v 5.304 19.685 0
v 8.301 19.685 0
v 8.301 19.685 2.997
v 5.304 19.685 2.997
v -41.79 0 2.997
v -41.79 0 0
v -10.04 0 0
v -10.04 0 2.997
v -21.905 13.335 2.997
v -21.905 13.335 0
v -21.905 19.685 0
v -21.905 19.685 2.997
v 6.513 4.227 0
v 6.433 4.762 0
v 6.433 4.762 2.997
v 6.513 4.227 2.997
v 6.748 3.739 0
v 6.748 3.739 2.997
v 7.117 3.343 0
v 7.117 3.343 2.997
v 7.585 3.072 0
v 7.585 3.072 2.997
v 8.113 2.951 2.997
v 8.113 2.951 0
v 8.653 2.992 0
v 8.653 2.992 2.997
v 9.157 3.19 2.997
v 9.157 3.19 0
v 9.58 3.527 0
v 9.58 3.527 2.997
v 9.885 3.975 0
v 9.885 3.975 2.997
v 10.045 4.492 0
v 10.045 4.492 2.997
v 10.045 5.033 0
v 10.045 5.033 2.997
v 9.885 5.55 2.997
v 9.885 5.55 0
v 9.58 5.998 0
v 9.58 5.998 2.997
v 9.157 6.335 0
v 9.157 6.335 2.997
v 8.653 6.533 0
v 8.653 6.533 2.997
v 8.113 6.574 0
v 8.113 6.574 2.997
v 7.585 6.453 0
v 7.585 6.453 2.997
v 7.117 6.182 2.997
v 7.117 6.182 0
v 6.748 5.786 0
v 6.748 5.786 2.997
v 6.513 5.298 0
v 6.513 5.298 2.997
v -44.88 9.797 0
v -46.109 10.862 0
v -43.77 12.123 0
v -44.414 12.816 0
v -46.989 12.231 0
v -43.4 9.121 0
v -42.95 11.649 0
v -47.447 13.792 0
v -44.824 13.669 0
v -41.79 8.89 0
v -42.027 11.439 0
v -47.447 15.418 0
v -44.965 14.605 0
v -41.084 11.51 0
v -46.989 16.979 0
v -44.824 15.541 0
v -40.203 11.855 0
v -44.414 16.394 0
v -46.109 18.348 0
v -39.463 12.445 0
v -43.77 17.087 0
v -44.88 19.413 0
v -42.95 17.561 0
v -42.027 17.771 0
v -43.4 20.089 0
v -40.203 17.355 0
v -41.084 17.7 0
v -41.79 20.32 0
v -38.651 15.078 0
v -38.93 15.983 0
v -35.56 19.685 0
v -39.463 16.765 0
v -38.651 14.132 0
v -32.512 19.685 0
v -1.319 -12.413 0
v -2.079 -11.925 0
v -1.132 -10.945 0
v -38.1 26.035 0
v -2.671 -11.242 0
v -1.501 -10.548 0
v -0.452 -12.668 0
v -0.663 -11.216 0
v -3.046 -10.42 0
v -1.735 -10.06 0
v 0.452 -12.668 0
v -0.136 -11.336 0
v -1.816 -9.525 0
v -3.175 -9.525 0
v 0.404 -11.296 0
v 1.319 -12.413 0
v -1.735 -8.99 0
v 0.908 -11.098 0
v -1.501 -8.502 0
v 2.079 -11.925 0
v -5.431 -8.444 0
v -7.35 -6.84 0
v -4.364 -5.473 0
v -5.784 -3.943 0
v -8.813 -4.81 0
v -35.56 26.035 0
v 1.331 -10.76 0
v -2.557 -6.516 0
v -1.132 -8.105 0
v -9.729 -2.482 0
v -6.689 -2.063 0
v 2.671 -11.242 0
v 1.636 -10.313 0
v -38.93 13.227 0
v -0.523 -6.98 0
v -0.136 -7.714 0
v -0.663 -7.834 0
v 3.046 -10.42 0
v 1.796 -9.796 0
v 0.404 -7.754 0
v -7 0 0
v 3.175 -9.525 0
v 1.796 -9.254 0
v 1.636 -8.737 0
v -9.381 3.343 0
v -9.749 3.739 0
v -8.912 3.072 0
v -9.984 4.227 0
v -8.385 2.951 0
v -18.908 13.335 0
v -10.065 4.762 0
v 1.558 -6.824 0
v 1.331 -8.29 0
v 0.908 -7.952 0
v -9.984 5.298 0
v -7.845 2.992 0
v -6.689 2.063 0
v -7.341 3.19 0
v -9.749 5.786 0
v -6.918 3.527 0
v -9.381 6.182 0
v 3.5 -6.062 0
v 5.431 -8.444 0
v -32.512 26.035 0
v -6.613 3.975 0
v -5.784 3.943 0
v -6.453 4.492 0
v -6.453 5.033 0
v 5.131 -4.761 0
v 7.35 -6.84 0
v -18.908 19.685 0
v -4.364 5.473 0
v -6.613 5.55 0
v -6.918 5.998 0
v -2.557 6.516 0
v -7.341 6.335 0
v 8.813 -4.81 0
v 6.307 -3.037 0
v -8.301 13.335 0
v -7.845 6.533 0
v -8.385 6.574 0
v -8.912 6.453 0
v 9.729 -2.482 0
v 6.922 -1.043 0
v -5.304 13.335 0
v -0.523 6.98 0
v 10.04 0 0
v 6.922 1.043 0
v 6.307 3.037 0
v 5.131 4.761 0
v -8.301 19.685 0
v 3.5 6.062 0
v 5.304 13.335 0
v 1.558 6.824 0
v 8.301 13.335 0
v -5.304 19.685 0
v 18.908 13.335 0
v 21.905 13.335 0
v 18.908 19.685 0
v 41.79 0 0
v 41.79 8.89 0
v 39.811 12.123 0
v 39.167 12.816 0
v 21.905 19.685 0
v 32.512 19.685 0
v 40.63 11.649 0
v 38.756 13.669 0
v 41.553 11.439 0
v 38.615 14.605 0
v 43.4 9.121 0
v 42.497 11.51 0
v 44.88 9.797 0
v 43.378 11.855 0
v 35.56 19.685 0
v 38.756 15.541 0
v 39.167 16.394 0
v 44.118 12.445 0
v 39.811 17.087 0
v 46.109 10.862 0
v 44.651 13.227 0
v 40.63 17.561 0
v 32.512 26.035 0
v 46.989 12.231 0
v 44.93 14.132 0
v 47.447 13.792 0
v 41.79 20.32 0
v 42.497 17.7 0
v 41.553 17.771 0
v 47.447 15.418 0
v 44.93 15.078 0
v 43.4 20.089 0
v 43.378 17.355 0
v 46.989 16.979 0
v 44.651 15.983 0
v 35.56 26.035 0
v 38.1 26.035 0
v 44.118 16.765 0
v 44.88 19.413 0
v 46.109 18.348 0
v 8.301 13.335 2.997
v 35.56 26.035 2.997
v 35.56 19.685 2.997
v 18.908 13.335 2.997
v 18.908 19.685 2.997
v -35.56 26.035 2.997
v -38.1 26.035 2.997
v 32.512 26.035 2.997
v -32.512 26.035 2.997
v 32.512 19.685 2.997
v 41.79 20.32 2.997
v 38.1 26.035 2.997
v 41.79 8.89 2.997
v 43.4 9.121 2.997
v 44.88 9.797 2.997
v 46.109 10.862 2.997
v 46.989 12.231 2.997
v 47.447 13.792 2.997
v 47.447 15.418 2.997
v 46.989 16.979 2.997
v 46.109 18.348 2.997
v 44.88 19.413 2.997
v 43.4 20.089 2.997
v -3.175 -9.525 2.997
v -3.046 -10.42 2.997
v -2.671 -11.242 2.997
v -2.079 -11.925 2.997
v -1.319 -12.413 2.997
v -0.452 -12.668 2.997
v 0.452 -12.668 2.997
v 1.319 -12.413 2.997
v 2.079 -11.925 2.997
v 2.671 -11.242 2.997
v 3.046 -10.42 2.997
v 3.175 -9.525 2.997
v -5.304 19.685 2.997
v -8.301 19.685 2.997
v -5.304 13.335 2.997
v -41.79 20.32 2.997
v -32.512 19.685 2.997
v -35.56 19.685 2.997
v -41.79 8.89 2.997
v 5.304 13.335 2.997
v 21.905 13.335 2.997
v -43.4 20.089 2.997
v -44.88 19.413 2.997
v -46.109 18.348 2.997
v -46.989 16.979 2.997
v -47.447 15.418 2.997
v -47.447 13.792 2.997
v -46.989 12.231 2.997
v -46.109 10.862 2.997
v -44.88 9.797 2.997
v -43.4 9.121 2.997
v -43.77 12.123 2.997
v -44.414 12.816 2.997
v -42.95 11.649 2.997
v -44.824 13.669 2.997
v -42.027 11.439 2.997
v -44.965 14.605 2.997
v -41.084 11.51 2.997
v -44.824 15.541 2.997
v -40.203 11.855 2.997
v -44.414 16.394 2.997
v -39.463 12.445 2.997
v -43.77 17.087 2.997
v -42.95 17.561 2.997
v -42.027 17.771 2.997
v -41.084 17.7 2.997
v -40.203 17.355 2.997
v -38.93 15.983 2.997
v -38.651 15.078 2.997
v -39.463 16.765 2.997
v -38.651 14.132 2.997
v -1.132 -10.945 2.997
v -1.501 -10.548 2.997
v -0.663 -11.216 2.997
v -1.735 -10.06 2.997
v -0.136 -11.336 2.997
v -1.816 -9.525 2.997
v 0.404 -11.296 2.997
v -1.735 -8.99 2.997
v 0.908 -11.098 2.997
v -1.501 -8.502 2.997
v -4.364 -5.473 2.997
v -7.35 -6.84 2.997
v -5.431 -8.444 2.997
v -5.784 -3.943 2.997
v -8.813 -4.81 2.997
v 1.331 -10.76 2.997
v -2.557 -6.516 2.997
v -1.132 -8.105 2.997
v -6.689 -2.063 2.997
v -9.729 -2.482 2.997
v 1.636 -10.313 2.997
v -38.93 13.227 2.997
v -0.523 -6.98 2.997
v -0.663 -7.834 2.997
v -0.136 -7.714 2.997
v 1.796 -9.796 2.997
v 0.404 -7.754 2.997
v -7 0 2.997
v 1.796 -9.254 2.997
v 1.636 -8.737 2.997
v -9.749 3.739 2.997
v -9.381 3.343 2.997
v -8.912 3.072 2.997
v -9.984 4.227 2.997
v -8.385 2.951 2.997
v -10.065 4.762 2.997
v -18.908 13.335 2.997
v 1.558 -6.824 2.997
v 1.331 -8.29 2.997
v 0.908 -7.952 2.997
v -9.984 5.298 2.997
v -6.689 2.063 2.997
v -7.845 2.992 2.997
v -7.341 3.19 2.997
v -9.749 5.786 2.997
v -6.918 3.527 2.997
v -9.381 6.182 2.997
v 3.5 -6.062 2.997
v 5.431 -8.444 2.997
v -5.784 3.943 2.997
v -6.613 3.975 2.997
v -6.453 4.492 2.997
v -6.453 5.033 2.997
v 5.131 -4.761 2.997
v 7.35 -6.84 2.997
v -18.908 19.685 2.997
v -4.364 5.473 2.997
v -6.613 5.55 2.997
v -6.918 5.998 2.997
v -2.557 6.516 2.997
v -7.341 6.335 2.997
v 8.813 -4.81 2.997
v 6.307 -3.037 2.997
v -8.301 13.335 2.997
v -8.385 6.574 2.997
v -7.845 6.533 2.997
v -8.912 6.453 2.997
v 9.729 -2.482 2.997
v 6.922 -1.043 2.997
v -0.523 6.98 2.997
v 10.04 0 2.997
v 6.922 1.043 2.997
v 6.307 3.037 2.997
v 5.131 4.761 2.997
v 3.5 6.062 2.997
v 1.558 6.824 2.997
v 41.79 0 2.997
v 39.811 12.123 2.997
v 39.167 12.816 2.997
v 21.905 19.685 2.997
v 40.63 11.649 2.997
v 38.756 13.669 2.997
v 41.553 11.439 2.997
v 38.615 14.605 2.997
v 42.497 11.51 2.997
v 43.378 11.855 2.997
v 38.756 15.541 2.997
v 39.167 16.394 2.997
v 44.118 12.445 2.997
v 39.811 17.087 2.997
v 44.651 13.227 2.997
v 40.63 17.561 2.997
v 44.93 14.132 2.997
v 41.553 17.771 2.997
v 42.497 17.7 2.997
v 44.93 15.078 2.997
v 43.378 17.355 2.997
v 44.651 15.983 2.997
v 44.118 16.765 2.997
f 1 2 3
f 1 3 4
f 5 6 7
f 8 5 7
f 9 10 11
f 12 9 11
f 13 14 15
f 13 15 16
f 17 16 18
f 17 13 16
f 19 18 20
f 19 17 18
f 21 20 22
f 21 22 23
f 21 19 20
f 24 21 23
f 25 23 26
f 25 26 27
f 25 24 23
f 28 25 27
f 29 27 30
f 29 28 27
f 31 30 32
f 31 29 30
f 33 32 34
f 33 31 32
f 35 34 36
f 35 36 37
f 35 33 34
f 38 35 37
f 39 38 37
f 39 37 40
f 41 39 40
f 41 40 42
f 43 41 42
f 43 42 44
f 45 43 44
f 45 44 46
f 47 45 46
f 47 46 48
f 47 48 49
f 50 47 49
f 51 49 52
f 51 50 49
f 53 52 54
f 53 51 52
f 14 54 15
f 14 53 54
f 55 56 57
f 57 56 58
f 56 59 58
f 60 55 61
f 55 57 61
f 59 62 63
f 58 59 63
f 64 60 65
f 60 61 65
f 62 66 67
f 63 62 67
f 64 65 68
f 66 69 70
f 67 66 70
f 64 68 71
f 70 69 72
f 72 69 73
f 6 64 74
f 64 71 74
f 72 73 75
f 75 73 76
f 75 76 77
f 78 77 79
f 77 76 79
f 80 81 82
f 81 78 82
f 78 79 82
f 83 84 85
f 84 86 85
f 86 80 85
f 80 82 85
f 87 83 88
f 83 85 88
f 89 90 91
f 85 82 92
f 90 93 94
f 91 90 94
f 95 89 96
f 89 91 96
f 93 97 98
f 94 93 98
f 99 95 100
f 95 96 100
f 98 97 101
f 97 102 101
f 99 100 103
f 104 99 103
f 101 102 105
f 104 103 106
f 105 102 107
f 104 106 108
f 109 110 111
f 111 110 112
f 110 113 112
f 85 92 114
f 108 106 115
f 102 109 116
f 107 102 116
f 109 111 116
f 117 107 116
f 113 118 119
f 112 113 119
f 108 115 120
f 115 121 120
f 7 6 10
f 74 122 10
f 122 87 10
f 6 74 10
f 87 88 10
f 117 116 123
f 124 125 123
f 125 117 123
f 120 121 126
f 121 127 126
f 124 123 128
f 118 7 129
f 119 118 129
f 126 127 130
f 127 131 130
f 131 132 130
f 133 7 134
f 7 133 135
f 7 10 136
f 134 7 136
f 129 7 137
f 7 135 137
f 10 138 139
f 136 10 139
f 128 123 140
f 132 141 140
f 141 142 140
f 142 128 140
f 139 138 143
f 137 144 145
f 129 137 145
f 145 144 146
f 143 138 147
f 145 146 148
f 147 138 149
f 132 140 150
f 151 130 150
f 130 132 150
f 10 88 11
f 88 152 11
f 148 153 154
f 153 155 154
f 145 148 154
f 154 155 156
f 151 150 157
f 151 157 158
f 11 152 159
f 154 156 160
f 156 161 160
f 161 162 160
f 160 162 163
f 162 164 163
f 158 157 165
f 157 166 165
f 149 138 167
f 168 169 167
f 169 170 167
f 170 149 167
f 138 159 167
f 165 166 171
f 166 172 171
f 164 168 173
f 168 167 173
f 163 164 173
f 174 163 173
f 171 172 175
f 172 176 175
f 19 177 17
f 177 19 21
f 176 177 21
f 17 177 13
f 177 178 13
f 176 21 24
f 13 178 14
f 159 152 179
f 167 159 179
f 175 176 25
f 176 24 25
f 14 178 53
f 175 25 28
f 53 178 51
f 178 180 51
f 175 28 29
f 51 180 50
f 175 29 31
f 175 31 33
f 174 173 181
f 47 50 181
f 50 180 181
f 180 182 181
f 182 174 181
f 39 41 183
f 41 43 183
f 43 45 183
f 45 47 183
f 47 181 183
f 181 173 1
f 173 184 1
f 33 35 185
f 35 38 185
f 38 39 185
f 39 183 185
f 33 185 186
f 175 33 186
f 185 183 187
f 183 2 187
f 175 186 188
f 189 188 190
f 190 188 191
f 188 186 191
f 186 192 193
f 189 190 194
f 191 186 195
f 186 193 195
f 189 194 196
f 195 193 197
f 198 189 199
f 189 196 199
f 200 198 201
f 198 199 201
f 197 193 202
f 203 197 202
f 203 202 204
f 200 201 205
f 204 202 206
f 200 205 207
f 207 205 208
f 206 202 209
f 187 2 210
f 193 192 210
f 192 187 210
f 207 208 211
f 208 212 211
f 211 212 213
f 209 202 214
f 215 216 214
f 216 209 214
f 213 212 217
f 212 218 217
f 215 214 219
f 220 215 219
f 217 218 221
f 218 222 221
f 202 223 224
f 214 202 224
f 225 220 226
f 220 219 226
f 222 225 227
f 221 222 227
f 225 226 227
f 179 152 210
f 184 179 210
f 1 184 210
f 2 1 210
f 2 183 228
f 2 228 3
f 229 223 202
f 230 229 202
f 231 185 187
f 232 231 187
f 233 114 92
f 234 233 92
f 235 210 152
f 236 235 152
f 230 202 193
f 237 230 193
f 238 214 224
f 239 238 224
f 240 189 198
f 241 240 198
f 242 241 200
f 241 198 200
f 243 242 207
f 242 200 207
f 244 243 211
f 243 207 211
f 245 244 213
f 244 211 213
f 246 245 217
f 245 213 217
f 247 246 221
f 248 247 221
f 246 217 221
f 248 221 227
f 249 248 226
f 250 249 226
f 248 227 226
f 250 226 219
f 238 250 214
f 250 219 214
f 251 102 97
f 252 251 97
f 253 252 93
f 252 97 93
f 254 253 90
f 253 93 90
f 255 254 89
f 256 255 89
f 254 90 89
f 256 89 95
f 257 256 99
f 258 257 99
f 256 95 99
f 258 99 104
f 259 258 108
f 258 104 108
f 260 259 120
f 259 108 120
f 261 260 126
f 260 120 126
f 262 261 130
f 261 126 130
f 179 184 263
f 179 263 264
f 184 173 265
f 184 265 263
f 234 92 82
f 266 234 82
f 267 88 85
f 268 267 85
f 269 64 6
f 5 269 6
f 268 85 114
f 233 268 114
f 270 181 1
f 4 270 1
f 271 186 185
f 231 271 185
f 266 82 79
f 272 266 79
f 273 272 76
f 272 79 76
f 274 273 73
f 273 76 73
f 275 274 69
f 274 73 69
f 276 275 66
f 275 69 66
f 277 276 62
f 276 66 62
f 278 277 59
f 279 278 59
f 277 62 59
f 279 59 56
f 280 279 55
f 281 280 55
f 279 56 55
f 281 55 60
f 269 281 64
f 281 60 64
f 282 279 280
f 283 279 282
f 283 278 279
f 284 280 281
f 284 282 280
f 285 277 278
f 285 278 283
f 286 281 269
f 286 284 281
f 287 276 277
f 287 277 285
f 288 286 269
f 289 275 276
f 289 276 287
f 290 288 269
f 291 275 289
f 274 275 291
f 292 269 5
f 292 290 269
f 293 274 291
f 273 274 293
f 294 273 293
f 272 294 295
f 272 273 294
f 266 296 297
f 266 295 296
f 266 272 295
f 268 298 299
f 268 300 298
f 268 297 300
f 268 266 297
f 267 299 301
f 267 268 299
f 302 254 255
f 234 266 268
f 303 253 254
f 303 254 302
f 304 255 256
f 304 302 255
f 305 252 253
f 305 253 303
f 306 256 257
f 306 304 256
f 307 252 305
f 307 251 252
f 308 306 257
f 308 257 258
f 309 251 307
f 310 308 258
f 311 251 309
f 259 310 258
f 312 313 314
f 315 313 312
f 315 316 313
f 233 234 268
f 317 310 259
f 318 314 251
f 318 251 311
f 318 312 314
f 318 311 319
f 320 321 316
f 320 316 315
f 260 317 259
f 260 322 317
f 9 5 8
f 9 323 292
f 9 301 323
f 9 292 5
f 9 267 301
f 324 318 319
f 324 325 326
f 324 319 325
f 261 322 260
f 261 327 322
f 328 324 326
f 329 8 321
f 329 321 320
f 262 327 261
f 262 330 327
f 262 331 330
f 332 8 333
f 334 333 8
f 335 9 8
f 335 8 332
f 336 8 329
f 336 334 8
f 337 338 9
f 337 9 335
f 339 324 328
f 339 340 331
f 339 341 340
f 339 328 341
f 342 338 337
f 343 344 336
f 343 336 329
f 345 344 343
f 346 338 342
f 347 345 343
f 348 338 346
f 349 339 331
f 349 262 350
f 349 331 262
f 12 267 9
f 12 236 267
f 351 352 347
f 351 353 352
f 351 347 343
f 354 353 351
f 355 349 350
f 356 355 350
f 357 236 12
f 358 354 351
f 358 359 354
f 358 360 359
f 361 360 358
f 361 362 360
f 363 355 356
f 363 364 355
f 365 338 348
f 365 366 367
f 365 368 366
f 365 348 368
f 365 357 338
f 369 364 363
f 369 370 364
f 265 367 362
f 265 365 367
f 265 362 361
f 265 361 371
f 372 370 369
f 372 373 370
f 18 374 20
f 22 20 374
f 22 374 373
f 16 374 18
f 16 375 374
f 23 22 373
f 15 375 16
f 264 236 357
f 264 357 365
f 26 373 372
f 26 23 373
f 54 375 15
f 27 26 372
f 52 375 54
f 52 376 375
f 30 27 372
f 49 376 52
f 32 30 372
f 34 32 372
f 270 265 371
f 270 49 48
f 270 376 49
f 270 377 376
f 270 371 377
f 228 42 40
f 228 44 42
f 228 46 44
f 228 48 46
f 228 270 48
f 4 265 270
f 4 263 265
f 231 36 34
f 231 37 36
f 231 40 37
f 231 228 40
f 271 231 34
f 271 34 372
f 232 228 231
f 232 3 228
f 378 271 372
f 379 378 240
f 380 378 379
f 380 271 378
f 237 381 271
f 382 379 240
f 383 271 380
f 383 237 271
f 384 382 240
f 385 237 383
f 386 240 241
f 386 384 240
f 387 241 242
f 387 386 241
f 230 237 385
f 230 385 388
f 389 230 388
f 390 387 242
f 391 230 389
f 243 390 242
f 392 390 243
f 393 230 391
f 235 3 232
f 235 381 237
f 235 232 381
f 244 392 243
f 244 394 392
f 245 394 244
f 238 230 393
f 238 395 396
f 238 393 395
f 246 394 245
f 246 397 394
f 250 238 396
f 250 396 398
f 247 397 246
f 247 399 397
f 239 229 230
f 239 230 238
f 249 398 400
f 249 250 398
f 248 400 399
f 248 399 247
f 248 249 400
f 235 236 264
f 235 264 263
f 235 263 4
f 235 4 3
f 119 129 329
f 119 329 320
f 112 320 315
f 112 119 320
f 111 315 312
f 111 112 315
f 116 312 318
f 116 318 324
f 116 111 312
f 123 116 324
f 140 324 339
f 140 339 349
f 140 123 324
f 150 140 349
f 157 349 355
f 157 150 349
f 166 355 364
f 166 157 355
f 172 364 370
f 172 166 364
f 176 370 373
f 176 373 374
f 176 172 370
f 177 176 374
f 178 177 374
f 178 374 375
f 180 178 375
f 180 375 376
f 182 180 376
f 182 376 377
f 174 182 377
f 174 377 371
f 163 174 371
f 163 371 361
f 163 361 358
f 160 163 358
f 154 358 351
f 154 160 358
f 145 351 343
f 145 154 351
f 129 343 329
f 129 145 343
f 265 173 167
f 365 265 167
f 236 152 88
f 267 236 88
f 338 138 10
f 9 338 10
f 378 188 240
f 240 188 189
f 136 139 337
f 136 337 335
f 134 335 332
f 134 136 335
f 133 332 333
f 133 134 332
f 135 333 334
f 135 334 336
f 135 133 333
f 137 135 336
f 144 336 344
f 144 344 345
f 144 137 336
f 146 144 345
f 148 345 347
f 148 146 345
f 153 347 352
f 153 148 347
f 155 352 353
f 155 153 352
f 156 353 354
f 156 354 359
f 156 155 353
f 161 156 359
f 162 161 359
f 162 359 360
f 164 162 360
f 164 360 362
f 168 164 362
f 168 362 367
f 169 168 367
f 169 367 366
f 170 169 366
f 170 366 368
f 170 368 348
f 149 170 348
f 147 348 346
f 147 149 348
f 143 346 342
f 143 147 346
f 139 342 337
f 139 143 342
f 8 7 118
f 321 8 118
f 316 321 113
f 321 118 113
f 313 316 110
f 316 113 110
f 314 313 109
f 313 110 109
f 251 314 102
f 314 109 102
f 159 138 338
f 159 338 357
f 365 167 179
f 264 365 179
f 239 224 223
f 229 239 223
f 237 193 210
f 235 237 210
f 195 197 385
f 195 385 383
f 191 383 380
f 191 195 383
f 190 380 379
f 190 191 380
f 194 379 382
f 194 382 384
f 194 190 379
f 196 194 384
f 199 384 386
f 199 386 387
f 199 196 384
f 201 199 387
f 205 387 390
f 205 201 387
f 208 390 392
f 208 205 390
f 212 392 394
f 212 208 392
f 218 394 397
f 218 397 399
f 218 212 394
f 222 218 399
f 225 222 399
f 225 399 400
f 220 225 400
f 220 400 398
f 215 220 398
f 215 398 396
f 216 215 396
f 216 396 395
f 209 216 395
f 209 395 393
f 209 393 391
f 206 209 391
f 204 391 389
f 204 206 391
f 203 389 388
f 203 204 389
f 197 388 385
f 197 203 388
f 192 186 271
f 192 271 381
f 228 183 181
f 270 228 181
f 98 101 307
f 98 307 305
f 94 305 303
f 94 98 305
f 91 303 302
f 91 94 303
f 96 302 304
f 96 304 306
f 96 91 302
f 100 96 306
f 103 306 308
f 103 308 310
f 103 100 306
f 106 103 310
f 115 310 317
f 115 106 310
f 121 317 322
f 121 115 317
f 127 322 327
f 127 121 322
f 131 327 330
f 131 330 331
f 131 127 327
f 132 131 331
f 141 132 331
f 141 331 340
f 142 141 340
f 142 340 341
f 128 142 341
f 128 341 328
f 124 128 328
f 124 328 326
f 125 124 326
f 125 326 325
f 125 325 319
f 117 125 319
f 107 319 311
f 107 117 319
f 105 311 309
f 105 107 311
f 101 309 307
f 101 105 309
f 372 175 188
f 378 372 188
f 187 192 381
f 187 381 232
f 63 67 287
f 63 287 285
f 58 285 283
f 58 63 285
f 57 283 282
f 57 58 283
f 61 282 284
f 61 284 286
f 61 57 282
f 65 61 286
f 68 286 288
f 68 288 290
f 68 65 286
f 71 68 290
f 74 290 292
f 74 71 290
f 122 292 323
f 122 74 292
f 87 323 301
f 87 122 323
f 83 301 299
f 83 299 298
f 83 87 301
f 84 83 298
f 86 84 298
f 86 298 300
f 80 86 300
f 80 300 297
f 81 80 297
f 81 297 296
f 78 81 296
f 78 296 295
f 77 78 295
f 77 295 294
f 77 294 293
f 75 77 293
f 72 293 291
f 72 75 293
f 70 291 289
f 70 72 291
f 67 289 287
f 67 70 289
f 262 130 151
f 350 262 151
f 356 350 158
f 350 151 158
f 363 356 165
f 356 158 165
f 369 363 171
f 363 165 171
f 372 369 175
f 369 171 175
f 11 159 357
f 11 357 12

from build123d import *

# Parameters (mm, degrees)
SKETCH2_R           = 3.175
SKETCH2_R_2         = 7
SKETCH2_R_3         = 1.8161
BOSS_EXTRUDE1_DEPTH = 2.9972
SKETCH3_W           = 2.9972
SKETCH3_H           = 6.35
CUT_EXTRUDE1_DEPTH  = 55.254506352


with BuildPart() as part:
    # Sketch2 → Boss-Extrude1 (new body)
    with BuildSketch(Plane.XY):
        with BuildLine():
            Line((-35.56, 26.035), (-38.1, 26.035))
            Line((-38.1, 26.035), (-41.790231571, 20.32))
            ThreePointArc((-41.790231571, 20.32), (-47.505231571, 14.605), (-41.790231571, 8.89))
            Line((-41.790231571, 8.89), (-41.790231571, 0))
            Line((-41.790231571, 0), (-10.040231571, 0))
            ThreePointArc((-10.040231571, 0), (-8.145059399, -5.87062666), (-3.175, -9.525))
            ThreePointArc((-3.175, -9.525), (0, -12.7), (3.175, -9.525))
            ThreePointArc((3.175, -9.525), (8.145059399, -5.87062666), (10.040231571, 0))
            Line((10.040231571, 0), (41.790231571, 0))
            Line((41.790231571, 0), (41.790231571, 8.89))
            ThreePointArc((41.790231571, 8.89), (47.505231571, 14.605), (41.790231571, 20.32))
            Line((41.790231571, 20.32), (38.1, 26.035))
            Line((38.1, 26.035), (35.56, 26.035))
            Line((35.56, 26.035), (35.56, 19.685))
            Line((35.56, 19.685), (32.512, 19.685))
            Line((32.512, 19.685), (32.512, 26.035))
            Line((32.512, 26.035), (-32.512, 26.035))
            Line((-32.512, 26.035), (-32.512, 19.685))
            Line((-32.512, 19.685), (-35.56, 19.685))
            Line((-35.56, 19.685), (-35.56, 26.035))
        make_face()
        with Locations((41.790231571, 14.605)):
            Circle(SKETCH2_R, mode=Mode.SUBTRACT)
        Circle(SKETCH2_R_2, mode=Mode.SUBTRACT)
        with Locations((8.248891971, 4.7625)):
            Circle(SKETCH2_R_3, mode=Mode.SUBTRACT)
        with Locations((-8.248891971, 4.7625)):
            Circle(SKETCH2_R_3, mode=Mode.SUBTRACT)
        with Locations((-41.790231571, 14.605)):
            Circle(SKETCH2_R, mode=Mode.SUBTRACT)
        with Locations((0, -9.525)):
            Circle(SKETCH2_R_3, mode=Mode.SUBTRACT)
    extrude(amount=BOSS_EXTRUDE1_DEPTH)

    # Sketch3 → Cut-Extrude1 (cut, through all)
    with BuildSketch(Plane(origin=(0, 0, 0), x_dir=(-1, 0, 0), z_dir=(0, 0, -1))):
        with Locations((-20.40636, 16.51)):
            Rectangle(SKETCH3_W, SKETCH3_H)
        with Locations((-6.80212, 16.51)):
            Rectangle(SKETCH3_W, SKETCH3_H)
        with Locations((6.80212, 16.51)):
            Rectangle(SKETCH3_W, SKETCH3_H)
        with Locations((20.40636, 16.51)):
            Rectangle(SKETCH3_W, SKETCH3_H)
    extrude(amount=-CUT_EXTRUDE1_DEPTH, mode=Mode.SUBTRACT)


solid = part.part
